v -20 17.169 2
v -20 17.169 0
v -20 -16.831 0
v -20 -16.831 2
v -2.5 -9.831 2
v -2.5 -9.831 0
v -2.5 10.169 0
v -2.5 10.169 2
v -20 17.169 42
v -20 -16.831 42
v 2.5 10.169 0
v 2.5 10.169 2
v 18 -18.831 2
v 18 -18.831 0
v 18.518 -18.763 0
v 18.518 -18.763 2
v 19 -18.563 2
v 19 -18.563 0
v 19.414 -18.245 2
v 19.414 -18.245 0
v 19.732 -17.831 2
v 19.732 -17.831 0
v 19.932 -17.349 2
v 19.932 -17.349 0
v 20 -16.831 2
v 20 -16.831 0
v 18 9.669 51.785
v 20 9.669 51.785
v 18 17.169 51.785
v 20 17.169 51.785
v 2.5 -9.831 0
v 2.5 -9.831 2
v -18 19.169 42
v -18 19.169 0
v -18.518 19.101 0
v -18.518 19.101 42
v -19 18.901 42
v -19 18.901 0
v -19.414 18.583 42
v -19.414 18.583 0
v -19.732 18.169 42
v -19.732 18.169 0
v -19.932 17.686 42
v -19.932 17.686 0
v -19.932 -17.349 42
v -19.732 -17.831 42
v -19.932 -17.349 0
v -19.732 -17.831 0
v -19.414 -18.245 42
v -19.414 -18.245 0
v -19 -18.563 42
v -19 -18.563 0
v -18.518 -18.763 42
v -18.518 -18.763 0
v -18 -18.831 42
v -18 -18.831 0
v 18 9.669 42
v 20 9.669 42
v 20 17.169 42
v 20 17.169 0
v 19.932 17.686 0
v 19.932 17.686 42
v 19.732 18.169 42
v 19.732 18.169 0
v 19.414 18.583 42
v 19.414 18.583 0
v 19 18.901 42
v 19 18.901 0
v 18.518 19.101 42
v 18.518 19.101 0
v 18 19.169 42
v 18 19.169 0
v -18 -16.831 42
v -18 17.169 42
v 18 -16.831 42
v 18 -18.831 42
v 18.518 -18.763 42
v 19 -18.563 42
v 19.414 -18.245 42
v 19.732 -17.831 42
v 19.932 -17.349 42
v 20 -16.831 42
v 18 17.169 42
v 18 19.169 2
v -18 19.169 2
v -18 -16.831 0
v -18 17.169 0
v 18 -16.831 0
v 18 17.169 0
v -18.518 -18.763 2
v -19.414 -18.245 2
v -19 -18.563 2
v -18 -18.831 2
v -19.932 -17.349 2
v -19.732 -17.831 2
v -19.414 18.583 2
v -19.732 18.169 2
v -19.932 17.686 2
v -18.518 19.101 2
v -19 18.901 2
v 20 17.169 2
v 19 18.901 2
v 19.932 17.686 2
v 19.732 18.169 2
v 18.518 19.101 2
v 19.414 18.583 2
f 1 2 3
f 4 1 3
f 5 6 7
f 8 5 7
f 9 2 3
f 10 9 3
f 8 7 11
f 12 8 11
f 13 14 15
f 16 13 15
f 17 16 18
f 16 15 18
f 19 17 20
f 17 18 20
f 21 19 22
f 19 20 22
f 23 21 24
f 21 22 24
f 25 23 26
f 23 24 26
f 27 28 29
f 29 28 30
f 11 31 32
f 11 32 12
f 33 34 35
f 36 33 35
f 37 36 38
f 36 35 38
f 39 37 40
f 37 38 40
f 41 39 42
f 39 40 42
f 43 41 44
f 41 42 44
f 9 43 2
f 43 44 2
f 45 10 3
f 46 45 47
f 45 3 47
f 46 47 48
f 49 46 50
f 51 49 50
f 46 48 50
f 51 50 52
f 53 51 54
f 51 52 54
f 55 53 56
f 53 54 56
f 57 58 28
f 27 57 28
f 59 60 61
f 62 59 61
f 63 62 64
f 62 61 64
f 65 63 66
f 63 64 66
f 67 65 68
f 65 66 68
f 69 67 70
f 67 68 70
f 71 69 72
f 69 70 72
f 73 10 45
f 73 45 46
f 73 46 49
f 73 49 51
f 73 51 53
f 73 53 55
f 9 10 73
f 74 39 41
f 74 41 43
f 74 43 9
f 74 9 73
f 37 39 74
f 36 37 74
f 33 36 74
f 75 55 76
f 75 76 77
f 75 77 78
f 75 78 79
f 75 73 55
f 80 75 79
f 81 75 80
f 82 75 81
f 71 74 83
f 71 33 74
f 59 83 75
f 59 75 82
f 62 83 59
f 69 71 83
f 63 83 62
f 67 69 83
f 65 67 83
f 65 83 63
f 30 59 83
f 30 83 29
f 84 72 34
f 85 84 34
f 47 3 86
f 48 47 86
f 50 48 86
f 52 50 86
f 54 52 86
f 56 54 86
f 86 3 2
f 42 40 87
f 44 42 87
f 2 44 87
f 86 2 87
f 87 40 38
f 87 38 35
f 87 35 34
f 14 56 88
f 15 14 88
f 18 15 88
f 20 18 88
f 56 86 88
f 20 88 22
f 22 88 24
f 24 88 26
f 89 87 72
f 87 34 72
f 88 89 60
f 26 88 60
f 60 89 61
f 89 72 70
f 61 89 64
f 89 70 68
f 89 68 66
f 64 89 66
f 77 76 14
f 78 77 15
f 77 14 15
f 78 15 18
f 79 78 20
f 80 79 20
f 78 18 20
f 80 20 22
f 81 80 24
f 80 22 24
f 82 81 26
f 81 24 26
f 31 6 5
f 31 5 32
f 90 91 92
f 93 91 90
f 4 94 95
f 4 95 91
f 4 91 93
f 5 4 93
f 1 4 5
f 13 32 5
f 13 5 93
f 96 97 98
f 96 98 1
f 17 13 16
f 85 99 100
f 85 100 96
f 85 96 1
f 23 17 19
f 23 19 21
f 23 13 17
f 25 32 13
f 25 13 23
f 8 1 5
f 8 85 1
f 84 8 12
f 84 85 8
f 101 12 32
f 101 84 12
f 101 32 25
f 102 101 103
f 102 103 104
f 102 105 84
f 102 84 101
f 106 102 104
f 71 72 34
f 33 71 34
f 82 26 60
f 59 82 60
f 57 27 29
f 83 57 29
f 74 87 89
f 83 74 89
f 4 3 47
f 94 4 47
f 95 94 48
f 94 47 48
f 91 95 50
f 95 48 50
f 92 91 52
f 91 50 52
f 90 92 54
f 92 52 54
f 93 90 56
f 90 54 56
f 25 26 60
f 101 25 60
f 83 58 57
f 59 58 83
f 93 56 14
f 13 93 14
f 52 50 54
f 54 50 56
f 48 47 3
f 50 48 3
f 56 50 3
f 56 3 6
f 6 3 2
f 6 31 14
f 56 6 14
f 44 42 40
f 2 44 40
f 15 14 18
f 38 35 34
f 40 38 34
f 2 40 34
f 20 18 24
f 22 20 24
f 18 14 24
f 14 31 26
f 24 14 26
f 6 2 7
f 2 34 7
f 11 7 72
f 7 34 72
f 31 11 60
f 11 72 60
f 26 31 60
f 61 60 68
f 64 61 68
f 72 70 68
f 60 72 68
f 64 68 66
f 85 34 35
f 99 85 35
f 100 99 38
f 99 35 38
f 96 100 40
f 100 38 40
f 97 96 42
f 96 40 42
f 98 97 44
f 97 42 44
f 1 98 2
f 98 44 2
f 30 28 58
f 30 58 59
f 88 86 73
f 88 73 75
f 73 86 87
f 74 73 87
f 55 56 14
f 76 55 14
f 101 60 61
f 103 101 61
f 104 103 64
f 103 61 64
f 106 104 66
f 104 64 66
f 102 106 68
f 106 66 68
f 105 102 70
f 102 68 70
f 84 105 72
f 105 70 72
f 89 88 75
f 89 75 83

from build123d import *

# Parameters (mm, degrees)
F0_W     = 36
F0_H     = 34
F0_W_2   = 5
F0_H_2   = 20
F1_DEPTH = 2
F2_DEPTH = 42
F3_W     = 7.5
F3_H     = 9.785272
F4_DEPTH = 2


with BuildPart() as f1:
    # F0 (on Top) → F1 (new body)
    with BuildSketch(Plane.XY):
        with BuildLine():
            Line((20, -16.831164), (20, 17.168836))
            ThreePointArc((20, 17.168836), (19.414214, 18.583049), (18, 19.168836))
            Line((18, 19.168836), (-18, 19.168836))
            ThreePointArc((-18, 19.168836), (-19.414214, 18.583049), (-20, 17.168836))
            Line((-20, 17.168836), (-20, -16.831164))
            ThreePointArc((-20, -16.831164), (-19.414214, -18.245378), (-18, -18.831164))
            Line((-18, -18.831164), (18, -18.831164))
            ThreePointArc((18, -18.831164), (19.414214, -18.245378), (20, -16.831164))
        make_face()
        with Locations((0, 0.168836)):
            Rectangle(F0_W, F0_H, mode=Mode.SUBTRACT)
        with Locations((0, 0.168836)):
            Rectangle(F0_W, F0_H)
        with Locations((0, 0.168836)):
            Rectangle(F0_W_2, F0_H_2, mode=Mode.SUBTRACT)
    extrude(amount=F1_DEPTH)


with BuildPart() as f2:
    # F0 (on Top) → F2 (new body)
    with BuildSketch(Plane.XY):
        with BuildLine():
            Line((20, -16.831164), (20, 17.168836))
            ThreePointArc((20, 17.168836), (19.414214, 18.583049), (18, 19.168836))
            Line((18, 19.168836), (-18, 19.168836))
            ThreePointArc((-18, 19.168836), (-19.414214, 18.583049), (-20, 17.168836))
            Line((-20, 17.168836), (-20, -16.831164))
            ThreePointArc((-20, -16.831164), (-19.414214, -18.245378), (-18, -18.831164))
            Line((-18, -18.831164), (18, -18.831164))
            ThreePointArc((18, -18.831164), (19.414214, -18.245378), (20, -16.831164))
        make_face()
        with Locations((0, 0.168836)):
            Rectangle(F0_W, F0_H, mode=Mode.SUBTRACT)
    extrude(amount=F2_DEPTH)


with BuildPart() as f4:
    # F3 (on face) → F4 (new body)
    with BuildSketch(Plane.YZ.offset(20)):
        with Locations((13.418836, 46.892636)):
            Rectangle(F3_W, F3_H)
    extrude(amount=-F4_DEPTH)


solid = Compound([f1.part, f2.part, f4.part])
